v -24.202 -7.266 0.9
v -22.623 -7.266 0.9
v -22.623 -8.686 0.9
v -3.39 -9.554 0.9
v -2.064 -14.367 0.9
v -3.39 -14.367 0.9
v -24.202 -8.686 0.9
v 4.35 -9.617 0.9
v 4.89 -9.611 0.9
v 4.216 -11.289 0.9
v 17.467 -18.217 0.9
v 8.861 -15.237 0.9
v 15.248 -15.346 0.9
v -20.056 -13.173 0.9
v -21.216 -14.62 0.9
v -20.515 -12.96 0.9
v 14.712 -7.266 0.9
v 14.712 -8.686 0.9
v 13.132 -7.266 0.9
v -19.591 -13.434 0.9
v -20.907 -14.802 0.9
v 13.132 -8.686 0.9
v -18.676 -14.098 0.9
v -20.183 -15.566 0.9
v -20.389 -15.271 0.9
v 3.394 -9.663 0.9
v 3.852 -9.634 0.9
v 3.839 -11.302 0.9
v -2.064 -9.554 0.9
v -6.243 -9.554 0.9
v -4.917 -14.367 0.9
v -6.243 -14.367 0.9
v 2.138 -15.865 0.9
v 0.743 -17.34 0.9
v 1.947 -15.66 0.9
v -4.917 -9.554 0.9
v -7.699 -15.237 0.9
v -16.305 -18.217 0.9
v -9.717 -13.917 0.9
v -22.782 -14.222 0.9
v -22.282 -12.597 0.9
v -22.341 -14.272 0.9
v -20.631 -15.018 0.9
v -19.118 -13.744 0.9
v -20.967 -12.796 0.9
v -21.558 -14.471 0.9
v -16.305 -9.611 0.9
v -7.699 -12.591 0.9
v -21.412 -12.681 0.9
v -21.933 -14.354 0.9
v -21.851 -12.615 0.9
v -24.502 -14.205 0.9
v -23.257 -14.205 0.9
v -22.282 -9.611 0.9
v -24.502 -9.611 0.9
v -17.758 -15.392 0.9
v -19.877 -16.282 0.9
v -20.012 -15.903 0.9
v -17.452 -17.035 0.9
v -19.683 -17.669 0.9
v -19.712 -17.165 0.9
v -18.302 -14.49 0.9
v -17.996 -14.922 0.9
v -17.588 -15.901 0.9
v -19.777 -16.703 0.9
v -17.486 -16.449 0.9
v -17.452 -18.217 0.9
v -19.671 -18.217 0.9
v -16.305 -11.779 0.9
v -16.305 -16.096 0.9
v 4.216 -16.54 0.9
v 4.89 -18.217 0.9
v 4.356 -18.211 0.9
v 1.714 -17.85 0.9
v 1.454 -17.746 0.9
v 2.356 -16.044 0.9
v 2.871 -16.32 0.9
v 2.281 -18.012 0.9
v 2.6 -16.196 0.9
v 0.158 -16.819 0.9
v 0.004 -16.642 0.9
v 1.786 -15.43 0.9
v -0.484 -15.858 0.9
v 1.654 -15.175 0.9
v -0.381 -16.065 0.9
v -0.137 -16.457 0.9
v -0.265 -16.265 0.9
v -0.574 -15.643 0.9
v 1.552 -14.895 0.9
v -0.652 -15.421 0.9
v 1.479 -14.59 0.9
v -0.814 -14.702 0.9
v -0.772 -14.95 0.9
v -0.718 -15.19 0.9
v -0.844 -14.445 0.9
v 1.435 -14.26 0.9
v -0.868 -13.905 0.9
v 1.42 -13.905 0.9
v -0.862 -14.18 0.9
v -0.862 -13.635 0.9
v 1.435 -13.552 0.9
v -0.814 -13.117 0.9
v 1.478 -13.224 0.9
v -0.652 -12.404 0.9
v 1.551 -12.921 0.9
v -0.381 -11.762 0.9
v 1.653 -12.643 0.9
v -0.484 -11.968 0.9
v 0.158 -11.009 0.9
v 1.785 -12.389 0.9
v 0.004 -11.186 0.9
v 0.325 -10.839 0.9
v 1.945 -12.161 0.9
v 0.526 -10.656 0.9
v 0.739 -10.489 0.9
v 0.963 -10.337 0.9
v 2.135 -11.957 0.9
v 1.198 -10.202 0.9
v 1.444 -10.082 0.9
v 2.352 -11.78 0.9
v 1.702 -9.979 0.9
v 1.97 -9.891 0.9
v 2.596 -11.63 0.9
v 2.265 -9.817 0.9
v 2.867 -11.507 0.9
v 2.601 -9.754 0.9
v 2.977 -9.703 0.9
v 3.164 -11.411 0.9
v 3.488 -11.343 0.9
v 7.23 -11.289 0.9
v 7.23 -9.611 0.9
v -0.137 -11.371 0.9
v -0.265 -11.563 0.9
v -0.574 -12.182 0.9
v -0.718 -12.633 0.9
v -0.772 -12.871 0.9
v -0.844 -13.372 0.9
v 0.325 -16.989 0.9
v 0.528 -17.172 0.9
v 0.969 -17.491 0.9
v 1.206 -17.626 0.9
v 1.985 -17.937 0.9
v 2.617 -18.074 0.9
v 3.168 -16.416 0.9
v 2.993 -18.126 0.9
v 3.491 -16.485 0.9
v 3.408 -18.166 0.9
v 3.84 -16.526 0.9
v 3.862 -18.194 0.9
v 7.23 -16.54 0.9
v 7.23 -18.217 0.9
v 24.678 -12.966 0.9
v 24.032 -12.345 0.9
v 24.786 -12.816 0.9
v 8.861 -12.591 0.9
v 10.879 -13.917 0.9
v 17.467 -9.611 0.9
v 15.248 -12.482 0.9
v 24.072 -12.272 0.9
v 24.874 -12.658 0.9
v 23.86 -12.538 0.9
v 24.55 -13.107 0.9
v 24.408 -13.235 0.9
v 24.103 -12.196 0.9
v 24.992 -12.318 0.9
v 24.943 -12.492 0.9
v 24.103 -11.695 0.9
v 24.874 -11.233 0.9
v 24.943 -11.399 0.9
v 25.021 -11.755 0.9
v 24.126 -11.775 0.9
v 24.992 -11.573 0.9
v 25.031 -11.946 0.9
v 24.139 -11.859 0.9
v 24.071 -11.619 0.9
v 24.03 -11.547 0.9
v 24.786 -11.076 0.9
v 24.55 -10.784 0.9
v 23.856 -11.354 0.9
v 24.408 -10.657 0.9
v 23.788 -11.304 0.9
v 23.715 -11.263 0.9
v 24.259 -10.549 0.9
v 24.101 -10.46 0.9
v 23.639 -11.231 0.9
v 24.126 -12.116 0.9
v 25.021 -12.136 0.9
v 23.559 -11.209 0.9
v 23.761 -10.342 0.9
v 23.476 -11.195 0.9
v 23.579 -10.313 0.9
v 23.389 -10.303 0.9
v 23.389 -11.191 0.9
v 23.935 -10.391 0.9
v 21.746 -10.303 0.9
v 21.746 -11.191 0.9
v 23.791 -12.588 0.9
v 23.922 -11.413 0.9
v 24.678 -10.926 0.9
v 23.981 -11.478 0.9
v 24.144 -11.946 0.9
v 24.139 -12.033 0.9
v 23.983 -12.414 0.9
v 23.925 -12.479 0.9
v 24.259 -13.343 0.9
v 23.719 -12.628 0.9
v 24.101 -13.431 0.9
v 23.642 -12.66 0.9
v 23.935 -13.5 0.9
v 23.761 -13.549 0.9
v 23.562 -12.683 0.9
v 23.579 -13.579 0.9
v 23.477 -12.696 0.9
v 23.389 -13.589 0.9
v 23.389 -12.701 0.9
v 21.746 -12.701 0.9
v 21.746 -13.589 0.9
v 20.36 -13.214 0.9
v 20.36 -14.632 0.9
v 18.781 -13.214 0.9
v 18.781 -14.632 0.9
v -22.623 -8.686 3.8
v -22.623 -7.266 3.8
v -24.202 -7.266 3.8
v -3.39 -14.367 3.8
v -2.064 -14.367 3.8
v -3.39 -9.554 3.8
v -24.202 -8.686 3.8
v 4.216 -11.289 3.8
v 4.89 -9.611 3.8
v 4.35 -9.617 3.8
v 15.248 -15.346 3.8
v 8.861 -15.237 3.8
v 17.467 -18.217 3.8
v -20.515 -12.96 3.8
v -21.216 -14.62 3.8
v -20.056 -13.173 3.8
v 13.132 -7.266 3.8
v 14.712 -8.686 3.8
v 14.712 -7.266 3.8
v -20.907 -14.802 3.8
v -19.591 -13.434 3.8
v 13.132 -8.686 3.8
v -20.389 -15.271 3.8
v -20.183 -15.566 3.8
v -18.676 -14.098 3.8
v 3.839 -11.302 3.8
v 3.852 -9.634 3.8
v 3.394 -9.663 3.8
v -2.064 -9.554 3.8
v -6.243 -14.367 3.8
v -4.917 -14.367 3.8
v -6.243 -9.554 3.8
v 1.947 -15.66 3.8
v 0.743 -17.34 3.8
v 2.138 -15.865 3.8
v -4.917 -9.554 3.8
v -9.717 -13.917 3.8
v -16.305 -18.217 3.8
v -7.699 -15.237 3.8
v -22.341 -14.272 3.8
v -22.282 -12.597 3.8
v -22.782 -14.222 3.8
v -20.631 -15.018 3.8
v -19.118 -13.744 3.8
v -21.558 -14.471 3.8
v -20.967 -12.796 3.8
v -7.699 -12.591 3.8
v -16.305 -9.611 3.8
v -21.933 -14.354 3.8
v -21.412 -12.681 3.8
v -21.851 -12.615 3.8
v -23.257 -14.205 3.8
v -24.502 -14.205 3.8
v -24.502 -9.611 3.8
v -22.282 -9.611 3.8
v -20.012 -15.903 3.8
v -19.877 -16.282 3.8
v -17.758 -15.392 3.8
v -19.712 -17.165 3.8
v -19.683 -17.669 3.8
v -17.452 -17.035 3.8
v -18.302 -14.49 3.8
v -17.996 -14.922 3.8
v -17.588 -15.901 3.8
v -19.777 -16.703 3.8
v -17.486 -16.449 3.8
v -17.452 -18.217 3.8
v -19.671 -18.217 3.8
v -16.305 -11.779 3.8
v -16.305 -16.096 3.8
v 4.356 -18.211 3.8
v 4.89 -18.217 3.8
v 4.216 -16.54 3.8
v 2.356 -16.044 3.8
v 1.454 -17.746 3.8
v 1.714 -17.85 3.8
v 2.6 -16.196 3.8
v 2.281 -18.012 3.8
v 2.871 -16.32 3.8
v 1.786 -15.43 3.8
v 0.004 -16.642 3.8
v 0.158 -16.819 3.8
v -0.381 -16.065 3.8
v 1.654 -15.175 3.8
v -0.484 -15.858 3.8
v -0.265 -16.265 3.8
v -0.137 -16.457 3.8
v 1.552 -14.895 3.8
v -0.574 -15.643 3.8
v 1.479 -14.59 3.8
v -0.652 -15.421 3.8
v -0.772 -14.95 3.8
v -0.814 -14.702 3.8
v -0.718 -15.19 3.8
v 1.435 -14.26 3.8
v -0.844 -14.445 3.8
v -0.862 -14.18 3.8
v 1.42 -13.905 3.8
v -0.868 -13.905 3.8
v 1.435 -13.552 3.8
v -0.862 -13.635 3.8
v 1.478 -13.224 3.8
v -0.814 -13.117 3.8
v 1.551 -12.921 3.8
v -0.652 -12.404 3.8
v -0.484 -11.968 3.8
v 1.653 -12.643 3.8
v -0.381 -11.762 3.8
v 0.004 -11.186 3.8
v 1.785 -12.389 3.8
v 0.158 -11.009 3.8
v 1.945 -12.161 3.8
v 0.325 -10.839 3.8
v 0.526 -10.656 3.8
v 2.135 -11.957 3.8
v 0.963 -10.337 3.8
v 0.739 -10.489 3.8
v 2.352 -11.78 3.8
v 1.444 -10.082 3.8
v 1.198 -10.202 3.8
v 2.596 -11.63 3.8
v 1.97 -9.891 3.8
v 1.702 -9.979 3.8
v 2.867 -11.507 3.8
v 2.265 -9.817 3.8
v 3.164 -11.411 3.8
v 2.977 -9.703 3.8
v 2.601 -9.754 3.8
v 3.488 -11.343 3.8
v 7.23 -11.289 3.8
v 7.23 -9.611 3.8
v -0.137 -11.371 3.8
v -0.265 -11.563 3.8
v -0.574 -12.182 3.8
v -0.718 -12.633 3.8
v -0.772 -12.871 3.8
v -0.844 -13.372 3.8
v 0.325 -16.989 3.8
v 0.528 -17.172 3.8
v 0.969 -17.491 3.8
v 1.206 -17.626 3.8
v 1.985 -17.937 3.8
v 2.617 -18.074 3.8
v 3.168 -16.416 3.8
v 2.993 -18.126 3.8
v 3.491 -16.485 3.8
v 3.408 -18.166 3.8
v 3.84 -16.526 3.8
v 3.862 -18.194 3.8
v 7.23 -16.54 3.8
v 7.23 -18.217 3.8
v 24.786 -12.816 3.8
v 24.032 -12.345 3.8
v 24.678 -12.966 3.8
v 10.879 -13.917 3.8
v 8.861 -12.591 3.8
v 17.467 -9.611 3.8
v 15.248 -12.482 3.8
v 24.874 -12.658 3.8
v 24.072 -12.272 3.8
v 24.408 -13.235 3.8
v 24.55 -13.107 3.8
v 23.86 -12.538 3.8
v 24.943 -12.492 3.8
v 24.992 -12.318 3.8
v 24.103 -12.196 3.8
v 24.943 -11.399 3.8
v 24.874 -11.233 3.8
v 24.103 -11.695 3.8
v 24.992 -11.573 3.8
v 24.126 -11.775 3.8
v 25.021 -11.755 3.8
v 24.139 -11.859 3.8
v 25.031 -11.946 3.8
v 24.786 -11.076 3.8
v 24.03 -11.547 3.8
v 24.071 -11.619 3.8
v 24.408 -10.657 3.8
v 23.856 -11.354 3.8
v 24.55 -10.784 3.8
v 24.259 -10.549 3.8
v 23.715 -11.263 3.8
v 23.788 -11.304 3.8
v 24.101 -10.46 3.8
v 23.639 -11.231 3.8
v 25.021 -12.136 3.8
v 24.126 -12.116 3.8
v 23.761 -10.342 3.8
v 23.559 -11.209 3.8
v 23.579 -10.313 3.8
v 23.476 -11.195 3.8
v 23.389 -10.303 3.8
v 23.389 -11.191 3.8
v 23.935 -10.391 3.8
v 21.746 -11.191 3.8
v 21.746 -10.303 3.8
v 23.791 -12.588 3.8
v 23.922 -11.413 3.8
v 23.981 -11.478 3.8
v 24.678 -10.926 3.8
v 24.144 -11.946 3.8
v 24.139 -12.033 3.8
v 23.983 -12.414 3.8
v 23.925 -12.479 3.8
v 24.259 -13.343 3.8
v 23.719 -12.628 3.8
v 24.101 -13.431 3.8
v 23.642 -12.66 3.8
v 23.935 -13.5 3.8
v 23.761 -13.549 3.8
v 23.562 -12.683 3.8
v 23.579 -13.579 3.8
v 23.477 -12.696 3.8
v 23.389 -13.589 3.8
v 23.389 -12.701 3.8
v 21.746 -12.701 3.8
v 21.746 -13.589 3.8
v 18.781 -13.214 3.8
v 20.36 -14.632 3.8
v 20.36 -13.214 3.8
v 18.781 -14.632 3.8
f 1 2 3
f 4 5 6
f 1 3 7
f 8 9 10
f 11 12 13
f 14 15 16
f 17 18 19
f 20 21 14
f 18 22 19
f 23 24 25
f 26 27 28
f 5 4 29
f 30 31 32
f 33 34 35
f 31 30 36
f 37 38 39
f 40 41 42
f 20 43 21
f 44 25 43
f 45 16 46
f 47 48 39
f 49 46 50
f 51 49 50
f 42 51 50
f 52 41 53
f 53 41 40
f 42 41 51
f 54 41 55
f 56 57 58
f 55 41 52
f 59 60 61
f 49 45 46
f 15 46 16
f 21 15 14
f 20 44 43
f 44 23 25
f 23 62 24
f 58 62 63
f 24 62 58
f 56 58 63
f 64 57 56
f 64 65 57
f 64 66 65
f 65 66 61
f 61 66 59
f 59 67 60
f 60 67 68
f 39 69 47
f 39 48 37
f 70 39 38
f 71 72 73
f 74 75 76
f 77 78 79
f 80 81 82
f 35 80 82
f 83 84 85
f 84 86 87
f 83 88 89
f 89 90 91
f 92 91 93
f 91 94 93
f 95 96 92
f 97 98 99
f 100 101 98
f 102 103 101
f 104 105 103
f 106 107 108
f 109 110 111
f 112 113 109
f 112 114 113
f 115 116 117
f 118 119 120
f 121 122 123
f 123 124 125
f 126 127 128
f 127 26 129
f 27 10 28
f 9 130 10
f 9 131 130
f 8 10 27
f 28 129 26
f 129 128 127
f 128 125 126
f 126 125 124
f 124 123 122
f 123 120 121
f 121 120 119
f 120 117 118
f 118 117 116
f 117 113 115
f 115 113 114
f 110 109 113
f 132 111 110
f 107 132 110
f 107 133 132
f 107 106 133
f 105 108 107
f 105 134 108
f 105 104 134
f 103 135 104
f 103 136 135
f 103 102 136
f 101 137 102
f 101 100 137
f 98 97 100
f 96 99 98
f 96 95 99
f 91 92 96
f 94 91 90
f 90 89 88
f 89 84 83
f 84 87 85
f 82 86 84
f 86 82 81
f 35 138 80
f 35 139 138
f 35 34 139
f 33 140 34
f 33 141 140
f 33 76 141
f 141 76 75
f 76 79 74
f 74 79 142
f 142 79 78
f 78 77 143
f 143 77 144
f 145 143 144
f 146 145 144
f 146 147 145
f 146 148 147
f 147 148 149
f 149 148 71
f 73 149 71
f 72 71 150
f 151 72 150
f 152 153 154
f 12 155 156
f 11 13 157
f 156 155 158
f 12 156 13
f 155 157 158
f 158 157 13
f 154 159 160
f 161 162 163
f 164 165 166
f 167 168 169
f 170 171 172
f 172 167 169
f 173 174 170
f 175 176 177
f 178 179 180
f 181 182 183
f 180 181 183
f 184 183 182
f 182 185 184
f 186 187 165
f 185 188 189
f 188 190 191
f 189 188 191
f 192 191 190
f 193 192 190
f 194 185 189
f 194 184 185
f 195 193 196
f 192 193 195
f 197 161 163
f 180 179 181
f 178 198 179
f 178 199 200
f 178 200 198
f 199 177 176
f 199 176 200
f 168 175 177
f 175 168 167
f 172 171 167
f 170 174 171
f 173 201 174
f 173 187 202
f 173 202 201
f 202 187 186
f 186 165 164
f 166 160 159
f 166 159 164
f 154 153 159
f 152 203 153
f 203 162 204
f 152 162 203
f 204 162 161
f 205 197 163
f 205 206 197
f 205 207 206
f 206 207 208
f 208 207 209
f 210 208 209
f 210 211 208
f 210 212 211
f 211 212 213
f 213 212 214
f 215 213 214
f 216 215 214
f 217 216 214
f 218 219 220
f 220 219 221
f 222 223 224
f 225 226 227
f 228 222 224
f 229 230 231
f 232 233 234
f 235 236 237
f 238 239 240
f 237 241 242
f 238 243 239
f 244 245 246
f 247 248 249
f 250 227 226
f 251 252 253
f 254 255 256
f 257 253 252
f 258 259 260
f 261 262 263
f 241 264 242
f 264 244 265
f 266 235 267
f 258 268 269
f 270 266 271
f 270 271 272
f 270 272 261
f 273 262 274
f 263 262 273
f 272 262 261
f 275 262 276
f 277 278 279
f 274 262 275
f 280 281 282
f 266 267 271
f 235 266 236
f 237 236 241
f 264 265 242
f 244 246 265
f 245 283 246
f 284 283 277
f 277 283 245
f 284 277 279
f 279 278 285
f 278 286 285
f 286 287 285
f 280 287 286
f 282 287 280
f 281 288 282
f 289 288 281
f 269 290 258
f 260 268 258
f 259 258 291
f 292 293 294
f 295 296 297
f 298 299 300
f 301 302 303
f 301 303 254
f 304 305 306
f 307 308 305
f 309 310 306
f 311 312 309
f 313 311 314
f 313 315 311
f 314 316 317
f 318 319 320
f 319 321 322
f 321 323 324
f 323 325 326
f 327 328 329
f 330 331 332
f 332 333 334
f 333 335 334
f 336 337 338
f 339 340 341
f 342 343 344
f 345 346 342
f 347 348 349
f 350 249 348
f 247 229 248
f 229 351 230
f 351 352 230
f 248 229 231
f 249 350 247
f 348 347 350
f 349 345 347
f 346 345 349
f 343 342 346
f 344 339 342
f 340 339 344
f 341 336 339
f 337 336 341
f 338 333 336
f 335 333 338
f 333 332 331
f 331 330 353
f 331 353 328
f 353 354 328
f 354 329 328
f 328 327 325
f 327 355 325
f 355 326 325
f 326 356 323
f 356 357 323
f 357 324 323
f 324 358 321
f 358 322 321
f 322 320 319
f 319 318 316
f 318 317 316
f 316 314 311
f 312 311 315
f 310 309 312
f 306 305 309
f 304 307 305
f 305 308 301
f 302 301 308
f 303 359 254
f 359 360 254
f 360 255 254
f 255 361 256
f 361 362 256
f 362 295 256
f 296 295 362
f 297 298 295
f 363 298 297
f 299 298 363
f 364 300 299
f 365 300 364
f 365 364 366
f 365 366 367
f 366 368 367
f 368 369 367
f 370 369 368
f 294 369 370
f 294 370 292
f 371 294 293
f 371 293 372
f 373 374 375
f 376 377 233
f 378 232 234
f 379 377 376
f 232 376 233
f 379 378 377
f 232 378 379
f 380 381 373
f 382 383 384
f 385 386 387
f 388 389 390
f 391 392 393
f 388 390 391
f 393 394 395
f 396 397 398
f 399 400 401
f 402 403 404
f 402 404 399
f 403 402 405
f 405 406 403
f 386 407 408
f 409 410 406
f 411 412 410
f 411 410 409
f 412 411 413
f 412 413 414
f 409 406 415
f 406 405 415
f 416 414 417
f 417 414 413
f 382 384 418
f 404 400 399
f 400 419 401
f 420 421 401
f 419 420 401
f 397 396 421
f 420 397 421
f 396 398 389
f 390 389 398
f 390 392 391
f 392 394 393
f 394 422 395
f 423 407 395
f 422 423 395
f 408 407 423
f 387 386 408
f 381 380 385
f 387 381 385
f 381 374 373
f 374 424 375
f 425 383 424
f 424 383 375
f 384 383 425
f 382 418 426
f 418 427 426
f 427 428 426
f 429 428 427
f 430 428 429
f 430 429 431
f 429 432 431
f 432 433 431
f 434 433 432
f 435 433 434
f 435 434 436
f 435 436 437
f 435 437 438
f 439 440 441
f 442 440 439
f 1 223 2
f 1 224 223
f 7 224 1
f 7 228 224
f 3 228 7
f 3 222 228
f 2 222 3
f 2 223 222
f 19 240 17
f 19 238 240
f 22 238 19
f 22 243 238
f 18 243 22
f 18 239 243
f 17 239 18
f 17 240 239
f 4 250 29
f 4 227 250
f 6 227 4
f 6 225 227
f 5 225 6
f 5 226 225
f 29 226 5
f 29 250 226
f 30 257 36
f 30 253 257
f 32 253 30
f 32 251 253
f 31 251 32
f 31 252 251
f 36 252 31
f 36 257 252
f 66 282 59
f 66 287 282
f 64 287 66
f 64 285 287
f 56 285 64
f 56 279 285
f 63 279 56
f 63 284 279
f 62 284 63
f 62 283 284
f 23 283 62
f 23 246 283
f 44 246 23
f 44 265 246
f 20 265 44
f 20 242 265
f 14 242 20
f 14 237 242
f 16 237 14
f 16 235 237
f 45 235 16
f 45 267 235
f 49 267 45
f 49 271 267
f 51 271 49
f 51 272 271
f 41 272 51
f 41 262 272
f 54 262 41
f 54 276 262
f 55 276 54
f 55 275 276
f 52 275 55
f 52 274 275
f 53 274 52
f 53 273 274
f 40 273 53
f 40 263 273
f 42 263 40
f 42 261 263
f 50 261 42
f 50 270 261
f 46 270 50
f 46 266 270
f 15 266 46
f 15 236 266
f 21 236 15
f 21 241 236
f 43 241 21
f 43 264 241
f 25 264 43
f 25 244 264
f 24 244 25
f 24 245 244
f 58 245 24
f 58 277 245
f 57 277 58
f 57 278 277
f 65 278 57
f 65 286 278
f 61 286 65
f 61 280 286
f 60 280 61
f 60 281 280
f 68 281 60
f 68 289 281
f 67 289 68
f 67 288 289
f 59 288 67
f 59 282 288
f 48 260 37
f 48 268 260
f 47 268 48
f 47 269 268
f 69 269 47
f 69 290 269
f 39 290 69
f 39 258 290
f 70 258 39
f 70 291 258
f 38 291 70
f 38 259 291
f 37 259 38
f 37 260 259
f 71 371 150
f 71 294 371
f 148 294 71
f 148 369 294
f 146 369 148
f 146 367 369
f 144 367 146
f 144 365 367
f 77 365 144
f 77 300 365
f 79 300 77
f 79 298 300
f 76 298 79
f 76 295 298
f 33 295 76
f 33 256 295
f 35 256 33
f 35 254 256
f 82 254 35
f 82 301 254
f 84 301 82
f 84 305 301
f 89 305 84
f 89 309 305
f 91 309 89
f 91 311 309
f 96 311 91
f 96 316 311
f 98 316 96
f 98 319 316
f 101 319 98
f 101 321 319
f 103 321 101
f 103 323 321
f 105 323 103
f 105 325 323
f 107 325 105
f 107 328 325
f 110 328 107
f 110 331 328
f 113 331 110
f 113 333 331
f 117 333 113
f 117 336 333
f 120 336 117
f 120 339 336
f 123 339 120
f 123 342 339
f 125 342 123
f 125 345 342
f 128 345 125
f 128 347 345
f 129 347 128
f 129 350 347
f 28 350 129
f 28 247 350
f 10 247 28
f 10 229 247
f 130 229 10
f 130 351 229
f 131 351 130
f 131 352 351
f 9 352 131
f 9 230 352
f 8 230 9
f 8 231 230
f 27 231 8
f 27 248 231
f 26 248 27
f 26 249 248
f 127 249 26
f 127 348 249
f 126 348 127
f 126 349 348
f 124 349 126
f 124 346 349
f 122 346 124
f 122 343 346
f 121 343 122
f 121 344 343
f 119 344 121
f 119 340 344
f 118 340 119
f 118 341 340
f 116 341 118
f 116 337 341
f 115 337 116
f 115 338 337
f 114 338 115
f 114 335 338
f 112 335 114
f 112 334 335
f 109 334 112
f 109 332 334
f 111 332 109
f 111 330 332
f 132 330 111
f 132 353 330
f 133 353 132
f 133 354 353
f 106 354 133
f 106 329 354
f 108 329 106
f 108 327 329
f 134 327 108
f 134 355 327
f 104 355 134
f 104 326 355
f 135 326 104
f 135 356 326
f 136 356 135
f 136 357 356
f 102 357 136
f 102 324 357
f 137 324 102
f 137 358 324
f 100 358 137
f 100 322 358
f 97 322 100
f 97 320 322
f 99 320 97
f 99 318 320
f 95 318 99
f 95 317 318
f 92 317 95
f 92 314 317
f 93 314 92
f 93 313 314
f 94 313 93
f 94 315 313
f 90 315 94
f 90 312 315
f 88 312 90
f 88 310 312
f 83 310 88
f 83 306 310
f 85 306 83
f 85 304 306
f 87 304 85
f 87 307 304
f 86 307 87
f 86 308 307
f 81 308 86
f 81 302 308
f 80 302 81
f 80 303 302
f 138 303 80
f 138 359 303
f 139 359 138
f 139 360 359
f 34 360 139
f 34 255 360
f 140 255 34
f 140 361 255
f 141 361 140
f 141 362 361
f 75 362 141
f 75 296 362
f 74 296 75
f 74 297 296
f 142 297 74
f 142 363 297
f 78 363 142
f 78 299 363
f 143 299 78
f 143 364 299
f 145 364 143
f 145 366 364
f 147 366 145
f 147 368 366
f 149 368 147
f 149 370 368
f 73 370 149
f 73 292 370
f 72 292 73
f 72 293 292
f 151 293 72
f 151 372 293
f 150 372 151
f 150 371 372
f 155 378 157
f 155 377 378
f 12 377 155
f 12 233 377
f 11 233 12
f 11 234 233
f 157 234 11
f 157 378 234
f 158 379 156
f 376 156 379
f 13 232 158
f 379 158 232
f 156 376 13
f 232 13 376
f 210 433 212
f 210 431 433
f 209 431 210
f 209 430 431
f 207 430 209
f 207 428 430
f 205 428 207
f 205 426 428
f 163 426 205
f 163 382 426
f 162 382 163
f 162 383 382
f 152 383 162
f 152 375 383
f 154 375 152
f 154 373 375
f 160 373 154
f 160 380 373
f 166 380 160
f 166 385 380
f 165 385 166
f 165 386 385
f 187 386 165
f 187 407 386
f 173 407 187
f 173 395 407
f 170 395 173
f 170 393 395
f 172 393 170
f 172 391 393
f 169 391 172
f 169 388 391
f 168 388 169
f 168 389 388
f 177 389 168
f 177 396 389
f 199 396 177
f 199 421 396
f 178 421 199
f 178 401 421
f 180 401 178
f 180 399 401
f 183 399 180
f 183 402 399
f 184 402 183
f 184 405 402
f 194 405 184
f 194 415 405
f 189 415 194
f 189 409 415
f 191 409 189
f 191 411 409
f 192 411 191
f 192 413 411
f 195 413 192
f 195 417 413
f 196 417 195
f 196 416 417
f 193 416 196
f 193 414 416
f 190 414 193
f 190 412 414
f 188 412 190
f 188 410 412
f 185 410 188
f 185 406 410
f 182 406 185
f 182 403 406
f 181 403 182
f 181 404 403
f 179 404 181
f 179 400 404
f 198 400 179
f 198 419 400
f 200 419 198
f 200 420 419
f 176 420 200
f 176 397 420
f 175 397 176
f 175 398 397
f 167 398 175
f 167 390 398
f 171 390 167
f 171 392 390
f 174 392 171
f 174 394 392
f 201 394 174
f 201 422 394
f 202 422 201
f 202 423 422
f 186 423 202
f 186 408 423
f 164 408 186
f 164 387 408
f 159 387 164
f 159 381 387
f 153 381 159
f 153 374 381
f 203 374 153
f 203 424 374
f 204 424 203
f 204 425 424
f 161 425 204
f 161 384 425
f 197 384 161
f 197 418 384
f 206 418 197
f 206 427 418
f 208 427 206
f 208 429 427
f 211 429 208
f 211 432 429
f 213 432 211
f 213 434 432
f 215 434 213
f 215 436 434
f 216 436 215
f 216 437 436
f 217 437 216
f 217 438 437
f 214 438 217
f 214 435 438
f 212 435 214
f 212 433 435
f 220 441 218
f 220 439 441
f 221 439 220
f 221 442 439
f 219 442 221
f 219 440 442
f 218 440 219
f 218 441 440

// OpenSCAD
$fn = 48;
  // syllabics (overlaid on icon, tallest) — row 3
  translate([0, -12.870, 0.900]) linear_extrude(height=2.900) text("ᓵᐳᐦᑕᐚᐣ", size=8.500, halign="center", valign="center", font="Euphemia UCAS:style=Bold");
